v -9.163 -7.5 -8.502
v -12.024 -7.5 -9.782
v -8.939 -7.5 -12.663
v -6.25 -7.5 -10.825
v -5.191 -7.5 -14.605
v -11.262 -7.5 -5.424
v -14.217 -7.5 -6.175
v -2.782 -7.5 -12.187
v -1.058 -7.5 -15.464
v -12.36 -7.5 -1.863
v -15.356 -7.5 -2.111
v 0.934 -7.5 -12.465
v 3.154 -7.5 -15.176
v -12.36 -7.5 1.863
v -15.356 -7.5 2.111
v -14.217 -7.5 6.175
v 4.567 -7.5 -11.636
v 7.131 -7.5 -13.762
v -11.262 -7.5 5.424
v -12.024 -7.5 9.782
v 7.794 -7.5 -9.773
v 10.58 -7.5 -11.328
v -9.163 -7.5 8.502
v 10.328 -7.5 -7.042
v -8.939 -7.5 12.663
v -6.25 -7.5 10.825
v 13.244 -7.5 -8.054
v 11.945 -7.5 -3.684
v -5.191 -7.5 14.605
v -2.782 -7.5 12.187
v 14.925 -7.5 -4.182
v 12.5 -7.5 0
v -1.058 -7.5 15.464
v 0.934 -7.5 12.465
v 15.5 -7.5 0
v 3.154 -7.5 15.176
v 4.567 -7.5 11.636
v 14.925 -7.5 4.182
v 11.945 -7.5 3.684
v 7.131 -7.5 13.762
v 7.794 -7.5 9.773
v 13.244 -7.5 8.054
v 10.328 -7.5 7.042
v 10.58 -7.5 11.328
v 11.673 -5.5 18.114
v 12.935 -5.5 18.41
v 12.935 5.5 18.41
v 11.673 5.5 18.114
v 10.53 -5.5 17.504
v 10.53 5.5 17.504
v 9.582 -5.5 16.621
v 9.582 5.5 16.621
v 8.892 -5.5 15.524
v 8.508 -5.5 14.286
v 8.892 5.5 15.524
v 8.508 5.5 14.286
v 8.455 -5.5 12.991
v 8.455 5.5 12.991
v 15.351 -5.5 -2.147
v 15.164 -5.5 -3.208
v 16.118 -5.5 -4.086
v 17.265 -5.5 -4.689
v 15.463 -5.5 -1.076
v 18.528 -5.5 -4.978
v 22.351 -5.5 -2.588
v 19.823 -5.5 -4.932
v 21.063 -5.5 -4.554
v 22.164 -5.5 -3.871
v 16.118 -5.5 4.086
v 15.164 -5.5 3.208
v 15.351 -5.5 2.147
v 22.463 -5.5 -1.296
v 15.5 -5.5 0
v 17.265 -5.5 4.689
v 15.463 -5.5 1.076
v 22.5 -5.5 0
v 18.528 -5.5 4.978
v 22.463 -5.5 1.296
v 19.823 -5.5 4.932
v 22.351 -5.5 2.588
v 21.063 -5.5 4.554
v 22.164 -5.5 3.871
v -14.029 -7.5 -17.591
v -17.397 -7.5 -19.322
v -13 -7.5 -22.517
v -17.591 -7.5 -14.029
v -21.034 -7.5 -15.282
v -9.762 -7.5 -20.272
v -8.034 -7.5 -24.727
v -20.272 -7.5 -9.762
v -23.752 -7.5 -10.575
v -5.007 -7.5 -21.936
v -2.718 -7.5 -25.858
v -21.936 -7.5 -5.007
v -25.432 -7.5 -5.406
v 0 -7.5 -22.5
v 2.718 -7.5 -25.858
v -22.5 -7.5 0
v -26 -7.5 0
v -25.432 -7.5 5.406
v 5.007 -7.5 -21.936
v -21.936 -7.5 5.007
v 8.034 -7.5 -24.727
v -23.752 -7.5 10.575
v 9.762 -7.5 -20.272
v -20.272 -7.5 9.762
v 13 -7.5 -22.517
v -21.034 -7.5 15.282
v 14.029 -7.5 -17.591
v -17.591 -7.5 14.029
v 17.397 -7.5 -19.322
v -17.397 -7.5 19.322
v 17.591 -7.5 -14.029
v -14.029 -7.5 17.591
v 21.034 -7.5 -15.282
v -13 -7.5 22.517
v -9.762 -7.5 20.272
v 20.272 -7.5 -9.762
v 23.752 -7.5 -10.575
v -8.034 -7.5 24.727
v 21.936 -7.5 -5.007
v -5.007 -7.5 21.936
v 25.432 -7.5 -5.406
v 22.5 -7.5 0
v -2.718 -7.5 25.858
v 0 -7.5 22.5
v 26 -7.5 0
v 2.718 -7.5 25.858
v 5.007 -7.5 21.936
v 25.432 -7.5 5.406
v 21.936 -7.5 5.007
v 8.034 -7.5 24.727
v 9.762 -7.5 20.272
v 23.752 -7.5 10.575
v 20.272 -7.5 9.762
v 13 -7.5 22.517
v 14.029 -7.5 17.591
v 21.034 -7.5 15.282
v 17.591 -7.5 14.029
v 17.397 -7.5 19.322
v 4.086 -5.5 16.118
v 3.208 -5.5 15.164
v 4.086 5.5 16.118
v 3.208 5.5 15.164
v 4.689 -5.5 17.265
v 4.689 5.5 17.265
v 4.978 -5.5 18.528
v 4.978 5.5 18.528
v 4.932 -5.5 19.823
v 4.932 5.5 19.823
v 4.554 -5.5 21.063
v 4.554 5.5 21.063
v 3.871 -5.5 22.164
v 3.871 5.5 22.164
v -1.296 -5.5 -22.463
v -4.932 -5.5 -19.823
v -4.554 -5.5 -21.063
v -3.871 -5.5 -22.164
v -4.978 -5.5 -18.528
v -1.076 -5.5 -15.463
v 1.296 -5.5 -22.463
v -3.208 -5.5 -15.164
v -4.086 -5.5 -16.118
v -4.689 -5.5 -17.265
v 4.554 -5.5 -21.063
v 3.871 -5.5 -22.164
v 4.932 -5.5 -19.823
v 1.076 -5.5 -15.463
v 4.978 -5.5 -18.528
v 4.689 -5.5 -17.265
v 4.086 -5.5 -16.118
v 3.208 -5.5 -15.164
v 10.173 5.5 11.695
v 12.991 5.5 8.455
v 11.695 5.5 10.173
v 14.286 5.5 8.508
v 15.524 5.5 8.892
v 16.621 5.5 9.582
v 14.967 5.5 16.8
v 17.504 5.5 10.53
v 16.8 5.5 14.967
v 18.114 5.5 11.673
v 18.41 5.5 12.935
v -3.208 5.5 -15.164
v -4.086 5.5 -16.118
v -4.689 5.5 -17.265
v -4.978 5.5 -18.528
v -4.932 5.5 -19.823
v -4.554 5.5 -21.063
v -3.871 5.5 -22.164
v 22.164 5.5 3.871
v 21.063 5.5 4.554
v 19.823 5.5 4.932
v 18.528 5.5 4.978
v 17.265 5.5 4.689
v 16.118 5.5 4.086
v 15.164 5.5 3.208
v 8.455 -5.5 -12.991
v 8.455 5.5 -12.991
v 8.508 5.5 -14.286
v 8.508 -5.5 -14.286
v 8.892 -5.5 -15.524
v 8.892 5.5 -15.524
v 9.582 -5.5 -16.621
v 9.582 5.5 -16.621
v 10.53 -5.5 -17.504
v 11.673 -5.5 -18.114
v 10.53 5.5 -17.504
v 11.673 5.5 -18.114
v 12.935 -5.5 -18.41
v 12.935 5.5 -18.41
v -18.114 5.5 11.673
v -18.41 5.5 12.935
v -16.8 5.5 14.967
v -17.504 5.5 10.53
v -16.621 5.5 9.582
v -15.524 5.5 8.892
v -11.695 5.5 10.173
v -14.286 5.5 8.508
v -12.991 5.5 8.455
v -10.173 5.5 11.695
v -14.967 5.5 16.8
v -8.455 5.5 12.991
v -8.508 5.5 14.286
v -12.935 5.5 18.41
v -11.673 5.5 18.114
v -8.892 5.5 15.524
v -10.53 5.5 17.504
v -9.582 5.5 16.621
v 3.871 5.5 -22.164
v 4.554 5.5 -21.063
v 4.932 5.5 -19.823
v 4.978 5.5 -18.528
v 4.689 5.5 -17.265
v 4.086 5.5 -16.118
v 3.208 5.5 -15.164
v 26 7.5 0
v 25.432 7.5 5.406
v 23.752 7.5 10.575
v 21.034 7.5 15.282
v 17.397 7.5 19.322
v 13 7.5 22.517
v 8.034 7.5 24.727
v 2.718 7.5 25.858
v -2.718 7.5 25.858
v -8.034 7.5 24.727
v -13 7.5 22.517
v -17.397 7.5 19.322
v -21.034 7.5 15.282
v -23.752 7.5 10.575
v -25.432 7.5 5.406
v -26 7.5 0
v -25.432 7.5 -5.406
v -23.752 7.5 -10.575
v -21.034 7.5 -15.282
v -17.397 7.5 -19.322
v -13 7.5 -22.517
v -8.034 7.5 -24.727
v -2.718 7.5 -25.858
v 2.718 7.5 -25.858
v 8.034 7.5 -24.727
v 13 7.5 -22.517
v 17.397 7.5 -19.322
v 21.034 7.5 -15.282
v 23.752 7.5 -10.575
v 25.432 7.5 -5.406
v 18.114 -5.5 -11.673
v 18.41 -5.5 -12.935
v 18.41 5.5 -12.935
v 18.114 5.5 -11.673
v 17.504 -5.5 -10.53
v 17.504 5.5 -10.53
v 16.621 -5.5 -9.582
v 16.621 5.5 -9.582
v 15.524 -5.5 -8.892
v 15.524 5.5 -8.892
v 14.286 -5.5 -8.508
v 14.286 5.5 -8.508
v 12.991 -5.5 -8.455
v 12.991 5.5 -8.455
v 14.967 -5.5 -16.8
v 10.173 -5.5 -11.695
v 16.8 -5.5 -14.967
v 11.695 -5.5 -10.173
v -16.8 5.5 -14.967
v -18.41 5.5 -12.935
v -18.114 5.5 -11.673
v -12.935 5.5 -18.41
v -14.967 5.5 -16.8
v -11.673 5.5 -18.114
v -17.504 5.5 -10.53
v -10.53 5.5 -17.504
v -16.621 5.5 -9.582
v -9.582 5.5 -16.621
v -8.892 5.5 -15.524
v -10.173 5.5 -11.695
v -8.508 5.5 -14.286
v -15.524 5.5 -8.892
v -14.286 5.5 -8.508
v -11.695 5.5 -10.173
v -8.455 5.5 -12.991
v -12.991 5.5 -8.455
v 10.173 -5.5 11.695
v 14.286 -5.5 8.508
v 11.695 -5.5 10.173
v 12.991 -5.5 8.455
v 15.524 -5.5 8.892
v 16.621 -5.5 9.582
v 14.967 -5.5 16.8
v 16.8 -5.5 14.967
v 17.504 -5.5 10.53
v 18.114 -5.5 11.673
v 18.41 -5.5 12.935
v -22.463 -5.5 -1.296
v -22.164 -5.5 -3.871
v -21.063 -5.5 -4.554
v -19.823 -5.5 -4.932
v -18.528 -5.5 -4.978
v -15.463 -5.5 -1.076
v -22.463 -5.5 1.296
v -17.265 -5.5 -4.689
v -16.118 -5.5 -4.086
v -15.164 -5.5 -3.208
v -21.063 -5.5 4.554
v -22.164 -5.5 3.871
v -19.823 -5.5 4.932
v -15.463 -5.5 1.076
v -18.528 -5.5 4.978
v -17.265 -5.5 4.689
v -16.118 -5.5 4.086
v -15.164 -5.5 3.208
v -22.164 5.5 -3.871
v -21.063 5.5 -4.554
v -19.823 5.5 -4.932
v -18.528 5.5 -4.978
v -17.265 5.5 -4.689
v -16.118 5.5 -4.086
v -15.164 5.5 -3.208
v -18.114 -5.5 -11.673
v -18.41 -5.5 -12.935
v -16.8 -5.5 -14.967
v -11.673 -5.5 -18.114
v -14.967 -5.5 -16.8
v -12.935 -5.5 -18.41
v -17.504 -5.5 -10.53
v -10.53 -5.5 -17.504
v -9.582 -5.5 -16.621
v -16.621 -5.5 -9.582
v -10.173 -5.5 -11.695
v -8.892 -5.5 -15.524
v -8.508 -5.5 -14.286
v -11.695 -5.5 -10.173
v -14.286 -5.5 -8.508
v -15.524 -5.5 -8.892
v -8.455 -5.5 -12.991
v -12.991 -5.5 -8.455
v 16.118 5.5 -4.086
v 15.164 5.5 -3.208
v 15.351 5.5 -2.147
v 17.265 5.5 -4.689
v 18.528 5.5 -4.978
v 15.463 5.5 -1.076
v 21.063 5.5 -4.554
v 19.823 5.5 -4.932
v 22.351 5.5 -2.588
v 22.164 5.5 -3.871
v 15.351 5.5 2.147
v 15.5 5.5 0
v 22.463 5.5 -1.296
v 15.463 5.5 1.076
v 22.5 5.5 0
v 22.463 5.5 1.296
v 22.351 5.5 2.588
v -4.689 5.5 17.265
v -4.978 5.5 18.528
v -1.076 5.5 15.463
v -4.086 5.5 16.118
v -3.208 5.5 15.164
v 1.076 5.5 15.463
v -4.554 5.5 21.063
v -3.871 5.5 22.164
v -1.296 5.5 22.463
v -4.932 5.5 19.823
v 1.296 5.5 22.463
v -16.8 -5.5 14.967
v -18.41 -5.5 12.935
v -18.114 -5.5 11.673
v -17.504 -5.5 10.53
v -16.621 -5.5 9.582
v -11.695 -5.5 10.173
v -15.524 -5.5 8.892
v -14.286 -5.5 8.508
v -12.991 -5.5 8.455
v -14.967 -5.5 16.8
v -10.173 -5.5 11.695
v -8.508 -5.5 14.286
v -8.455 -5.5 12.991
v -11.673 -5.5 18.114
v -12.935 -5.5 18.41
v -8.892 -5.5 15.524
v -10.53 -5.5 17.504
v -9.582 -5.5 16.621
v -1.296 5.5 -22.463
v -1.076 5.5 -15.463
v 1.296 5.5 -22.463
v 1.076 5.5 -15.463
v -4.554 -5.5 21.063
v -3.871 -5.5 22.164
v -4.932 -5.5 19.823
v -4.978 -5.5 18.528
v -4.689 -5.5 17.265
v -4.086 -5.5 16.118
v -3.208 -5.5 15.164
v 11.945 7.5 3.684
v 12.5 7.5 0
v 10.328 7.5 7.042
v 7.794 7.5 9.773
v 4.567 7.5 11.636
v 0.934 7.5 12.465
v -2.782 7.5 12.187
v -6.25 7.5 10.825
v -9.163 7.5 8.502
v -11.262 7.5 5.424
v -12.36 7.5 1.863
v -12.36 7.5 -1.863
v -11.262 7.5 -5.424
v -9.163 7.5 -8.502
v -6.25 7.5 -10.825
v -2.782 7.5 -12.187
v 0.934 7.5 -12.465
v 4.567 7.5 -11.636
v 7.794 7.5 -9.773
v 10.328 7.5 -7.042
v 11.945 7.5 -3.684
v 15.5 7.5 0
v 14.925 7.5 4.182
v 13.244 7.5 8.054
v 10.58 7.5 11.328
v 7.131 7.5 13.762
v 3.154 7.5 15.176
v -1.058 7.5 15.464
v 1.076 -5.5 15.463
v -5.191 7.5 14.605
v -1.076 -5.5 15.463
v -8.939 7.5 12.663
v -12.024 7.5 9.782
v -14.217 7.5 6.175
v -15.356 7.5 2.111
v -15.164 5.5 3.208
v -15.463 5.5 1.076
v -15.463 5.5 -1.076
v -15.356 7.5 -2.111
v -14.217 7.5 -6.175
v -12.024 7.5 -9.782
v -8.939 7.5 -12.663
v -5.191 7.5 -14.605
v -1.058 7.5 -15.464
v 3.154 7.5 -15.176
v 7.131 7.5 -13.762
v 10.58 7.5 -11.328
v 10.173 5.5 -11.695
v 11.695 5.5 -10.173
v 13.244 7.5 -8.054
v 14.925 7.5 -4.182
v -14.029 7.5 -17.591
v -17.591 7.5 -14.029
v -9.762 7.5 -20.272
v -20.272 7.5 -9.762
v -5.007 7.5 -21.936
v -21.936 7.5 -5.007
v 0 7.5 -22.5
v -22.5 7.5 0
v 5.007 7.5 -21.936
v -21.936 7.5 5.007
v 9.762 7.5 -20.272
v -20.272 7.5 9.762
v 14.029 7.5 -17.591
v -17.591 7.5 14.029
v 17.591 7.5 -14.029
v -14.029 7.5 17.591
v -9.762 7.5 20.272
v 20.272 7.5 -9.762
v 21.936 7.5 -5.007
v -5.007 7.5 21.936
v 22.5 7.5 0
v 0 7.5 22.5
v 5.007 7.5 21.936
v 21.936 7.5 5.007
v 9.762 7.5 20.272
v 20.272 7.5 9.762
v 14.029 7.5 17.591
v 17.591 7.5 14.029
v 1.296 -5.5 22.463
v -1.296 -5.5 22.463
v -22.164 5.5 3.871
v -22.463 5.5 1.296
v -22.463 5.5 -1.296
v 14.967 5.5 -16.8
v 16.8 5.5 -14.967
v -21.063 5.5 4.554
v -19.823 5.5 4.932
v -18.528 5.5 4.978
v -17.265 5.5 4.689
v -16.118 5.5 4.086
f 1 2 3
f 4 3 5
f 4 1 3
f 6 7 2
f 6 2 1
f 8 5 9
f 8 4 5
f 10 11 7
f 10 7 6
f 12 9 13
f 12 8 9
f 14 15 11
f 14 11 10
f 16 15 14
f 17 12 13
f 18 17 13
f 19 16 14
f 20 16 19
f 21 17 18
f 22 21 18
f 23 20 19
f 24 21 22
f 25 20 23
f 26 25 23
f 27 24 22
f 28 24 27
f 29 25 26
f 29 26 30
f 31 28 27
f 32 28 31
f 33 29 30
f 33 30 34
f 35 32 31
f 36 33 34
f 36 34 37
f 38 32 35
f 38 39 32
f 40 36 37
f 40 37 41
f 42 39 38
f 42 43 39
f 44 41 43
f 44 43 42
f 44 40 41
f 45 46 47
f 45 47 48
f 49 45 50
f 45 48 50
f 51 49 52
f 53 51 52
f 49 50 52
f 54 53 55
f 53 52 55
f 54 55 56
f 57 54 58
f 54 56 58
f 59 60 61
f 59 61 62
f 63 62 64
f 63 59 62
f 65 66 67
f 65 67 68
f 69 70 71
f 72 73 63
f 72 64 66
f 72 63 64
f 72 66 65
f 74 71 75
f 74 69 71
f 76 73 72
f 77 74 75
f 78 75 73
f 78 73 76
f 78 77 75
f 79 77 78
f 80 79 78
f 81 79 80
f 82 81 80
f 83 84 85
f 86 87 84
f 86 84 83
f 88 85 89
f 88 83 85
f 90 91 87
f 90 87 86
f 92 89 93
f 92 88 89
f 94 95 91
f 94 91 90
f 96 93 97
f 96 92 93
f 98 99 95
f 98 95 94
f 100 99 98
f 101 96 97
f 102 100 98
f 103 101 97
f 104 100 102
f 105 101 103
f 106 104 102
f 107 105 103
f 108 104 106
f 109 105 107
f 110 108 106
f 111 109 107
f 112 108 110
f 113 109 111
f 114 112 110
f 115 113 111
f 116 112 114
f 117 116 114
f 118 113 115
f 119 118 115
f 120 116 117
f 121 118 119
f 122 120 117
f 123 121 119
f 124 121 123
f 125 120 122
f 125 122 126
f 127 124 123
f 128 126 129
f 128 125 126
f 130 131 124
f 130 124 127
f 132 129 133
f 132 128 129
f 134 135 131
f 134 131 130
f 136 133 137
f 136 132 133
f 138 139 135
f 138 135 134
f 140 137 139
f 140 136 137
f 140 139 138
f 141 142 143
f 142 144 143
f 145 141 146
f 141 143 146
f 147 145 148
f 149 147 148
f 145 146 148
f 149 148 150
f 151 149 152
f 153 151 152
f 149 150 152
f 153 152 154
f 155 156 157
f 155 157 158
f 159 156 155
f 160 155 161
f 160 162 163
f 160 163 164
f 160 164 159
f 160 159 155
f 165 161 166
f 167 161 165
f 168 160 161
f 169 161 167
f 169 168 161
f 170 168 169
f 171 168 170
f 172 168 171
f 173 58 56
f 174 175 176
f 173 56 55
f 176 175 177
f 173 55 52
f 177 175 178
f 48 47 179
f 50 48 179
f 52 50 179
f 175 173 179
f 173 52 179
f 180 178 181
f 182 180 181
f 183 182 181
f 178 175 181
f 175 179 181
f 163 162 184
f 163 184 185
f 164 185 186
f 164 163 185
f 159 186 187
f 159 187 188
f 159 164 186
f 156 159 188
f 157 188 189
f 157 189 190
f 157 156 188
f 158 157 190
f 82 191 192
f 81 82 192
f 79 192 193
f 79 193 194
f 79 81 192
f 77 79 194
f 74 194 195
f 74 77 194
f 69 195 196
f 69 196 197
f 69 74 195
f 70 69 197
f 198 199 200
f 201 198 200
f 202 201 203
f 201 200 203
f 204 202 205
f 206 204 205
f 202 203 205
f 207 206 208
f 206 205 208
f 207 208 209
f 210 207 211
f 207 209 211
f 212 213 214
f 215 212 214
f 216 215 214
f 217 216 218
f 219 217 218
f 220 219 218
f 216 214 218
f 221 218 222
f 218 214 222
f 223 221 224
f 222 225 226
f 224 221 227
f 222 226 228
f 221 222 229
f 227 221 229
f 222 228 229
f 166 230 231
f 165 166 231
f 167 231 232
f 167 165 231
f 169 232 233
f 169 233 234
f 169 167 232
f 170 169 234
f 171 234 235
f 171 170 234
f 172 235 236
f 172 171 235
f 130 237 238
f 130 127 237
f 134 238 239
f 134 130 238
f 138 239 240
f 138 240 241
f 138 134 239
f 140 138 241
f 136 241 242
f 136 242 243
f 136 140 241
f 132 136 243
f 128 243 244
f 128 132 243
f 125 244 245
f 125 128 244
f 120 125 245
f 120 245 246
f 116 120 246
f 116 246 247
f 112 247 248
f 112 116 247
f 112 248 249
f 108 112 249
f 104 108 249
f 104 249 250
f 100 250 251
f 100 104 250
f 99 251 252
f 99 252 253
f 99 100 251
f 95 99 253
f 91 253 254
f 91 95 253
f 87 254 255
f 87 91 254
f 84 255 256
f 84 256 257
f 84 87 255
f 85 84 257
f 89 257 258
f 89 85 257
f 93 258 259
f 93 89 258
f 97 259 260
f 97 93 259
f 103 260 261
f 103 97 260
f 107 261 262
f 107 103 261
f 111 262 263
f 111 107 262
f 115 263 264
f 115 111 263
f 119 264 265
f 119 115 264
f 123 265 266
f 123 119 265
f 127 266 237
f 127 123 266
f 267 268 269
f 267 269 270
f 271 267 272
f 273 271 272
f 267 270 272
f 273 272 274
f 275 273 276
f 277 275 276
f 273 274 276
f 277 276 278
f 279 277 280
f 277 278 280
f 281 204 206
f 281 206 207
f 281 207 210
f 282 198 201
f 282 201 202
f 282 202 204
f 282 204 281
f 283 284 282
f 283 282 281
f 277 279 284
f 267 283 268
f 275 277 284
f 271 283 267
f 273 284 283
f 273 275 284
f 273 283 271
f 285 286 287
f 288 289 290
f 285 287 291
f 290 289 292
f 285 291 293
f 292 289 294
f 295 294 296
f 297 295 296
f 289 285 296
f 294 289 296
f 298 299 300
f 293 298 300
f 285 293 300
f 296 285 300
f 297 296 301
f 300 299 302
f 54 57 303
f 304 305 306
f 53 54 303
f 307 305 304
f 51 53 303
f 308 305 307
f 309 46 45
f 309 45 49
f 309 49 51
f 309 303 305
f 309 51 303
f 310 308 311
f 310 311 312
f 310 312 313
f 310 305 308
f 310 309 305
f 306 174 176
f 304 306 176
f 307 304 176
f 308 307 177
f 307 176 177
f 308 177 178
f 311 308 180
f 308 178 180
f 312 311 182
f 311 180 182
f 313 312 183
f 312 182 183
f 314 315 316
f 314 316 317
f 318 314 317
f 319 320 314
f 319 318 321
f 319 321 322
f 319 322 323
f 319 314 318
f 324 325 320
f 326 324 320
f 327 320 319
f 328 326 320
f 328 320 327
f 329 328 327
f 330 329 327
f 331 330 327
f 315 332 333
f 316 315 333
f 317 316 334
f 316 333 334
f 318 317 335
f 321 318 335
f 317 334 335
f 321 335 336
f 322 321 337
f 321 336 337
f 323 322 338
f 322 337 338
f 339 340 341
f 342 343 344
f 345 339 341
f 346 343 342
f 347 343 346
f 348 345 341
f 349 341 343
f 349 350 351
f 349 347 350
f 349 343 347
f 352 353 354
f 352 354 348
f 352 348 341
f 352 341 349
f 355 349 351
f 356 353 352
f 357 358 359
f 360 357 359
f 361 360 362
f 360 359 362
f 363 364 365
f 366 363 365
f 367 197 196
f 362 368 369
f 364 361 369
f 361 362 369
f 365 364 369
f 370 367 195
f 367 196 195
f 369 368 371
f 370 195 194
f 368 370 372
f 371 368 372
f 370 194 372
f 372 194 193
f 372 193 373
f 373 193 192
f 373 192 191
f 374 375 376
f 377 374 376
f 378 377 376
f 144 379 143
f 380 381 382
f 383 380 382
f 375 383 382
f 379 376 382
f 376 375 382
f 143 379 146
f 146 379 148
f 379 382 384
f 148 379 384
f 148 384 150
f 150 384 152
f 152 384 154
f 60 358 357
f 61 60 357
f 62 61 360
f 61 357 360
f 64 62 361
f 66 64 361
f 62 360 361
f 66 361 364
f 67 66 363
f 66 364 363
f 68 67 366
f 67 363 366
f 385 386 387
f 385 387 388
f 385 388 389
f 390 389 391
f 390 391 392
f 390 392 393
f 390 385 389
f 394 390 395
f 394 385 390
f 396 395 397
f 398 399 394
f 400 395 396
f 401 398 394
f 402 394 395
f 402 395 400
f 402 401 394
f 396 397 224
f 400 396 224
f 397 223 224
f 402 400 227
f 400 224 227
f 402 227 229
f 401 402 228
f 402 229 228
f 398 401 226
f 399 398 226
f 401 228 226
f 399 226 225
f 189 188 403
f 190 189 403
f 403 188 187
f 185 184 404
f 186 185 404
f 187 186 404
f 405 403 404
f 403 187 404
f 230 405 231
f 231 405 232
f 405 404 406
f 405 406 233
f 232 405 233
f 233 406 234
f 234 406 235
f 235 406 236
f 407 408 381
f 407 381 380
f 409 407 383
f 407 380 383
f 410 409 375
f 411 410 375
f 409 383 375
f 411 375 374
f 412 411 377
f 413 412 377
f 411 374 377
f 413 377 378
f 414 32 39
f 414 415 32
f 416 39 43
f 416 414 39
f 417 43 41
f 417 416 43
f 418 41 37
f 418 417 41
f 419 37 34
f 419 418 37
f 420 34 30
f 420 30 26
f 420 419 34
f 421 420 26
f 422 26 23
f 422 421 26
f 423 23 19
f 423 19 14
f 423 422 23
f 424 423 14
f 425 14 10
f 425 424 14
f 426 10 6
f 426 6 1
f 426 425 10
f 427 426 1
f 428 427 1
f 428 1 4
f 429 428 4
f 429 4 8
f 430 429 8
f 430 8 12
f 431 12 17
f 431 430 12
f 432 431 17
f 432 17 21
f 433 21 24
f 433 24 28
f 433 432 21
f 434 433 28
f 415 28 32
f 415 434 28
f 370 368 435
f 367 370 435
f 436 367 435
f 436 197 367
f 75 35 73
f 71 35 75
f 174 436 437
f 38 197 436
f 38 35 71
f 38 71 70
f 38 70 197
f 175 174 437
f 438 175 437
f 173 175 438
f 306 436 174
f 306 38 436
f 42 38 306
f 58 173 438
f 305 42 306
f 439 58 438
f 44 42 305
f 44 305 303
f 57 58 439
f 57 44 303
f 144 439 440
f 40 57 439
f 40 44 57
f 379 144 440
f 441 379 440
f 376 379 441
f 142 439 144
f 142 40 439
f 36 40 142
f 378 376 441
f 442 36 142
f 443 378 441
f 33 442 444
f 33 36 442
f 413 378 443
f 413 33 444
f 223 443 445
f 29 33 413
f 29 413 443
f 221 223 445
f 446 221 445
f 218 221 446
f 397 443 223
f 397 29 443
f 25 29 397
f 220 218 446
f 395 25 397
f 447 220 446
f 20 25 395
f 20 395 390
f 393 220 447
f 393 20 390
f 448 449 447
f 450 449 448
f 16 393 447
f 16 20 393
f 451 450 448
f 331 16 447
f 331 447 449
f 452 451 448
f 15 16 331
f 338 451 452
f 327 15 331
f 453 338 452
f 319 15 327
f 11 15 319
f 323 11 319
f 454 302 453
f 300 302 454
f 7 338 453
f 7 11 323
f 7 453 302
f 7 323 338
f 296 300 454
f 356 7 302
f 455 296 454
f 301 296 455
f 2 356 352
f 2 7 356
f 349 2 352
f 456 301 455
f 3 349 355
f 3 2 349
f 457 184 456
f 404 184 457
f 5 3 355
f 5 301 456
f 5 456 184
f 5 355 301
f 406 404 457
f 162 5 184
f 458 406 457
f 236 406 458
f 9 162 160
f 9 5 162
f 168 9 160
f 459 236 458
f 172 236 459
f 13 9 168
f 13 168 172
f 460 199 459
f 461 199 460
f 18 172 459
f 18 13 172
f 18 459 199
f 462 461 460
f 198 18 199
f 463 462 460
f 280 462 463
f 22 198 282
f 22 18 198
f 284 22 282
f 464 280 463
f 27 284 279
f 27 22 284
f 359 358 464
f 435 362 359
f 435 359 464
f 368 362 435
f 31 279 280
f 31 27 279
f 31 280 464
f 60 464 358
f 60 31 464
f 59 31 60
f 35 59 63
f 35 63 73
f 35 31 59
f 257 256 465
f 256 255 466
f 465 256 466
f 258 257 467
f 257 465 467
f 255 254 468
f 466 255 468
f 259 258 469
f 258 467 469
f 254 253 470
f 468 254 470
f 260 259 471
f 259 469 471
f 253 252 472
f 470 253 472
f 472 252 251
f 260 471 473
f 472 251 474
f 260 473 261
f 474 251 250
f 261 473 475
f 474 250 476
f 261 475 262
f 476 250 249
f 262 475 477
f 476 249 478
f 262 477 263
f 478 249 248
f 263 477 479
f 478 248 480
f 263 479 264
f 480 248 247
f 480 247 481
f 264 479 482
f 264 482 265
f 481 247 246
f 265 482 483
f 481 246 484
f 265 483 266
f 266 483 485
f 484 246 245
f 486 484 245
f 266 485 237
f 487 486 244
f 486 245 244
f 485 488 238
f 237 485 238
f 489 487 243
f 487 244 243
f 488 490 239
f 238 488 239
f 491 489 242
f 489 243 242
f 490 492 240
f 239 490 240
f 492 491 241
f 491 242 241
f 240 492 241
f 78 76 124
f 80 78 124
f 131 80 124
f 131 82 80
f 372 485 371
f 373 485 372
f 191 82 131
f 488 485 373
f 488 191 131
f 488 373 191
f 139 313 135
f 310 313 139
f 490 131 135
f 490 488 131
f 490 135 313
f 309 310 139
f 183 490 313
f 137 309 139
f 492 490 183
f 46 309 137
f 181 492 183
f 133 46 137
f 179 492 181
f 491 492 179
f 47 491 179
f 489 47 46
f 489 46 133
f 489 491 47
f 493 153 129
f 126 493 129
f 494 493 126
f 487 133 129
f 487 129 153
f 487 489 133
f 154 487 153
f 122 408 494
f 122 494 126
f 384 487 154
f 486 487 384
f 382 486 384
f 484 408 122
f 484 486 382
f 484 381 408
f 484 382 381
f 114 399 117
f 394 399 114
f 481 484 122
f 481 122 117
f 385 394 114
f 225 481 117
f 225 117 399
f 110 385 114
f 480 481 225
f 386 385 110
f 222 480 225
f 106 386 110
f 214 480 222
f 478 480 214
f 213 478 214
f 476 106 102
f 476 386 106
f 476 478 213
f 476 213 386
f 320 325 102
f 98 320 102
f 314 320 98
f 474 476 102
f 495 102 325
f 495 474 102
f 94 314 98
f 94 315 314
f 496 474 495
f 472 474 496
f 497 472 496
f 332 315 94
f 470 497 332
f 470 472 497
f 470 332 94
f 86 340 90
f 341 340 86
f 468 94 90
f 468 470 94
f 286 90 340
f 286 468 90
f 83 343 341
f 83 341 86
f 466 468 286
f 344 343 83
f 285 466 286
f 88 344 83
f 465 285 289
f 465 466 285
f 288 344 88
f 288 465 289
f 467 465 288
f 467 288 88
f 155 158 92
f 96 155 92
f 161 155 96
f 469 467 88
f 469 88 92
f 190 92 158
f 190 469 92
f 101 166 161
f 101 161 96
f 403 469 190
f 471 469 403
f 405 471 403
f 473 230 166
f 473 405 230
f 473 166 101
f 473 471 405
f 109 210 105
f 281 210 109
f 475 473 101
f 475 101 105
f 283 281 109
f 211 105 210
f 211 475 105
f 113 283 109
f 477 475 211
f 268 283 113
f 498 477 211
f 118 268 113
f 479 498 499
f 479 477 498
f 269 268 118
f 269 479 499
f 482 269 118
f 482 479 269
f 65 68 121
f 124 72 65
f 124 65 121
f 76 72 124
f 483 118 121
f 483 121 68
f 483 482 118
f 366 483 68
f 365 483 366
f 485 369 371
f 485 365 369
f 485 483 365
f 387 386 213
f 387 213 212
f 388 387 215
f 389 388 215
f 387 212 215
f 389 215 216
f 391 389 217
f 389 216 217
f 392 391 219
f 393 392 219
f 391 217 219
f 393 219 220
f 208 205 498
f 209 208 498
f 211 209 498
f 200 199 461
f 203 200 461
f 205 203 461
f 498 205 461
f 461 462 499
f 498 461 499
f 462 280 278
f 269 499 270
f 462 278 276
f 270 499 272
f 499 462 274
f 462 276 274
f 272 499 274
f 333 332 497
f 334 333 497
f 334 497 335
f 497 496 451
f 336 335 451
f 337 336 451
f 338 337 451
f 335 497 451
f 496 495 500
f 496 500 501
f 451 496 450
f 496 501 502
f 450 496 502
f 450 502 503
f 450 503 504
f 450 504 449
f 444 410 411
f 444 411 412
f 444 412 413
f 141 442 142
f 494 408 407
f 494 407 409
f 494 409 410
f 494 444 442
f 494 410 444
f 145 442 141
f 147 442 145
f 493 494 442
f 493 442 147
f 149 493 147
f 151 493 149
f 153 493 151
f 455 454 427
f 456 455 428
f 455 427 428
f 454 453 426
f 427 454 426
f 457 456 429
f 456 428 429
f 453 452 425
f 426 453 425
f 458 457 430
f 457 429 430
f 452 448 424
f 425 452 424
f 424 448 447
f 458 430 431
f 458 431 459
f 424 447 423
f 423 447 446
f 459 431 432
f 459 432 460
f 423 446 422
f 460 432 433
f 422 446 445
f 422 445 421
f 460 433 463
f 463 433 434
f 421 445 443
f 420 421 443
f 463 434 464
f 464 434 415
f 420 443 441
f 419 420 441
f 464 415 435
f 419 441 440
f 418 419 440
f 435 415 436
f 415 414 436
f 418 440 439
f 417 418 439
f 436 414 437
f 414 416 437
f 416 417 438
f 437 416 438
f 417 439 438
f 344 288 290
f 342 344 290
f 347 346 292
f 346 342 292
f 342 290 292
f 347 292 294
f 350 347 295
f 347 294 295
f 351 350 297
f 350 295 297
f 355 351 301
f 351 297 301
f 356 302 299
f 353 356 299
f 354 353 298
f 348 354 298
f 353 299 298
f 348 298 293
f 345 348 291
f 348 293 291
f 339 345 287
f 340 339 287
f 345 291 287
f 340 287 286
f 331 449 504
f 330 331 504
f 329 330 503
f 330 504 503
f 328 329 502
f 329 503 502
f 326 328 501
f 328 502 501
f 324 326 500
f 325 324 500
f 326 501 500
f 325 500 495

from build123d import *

# Parameters (mm, degrees)
F0_R     = 15.5
F0_R_2   = 12.5
F1_DEPTH = 7.5
F2_R     = 26
F2_R_2   = 22.5
F3_DEPTH = 7.5
F4_R     = 5
F5_DEPTH = 5.5


with BuildPart() as f1:
    # F0 (on Front) → F1 (new body, symmetric)
    with BuildSketch(Plane.XZ):
        Circle(F0_R)
        Circle(F0_R_2, mode=Mode.SUBTRACT)
    extrude(amount=F1_DEPTH, both=True)



with BuildPart() as f3:
    # F2 (on Front) → F3 (new body, symmetric)
    with BuildSketch(Plane.XZ):
        Circle(F2_R)
        Circle(F2_R_2, mode=Mode.SUBTRACT)
    extrude(amount=F3_DEPTH, both=True)


with BuildPart() as f1_1:
    add(f1.part)

    add(f3.part)  # F5 merges F3
    # F4 (on Front) → F5 (join, symmetric)
    with BuildSketch(Plane.XZ):
        with Locations((-13.4350288425, 13.4350288425)):
            Circle(F4_R)
        with Locations((0, 19)):
            Circle(F4_R)
        with Locations((13.4350288425, 13.4350288425)):
            Circle(F4_R)
        with Locations((19, 0)):
            Circle(F4_R)
        with Locations((-19, 0)):
            Circle(F4_R)
        with Locations((-13.4350288425, -13.4350288425)):
            Circle(F4_R)
        with Locations((13.4350288425, -13.4350288425)):
            Circle(F4_R)
        with Locations((0, -19)):
            Circle(F4_R)
    extrude(amount=F5_DEPTH, both=True)


solid = f1_1.part
